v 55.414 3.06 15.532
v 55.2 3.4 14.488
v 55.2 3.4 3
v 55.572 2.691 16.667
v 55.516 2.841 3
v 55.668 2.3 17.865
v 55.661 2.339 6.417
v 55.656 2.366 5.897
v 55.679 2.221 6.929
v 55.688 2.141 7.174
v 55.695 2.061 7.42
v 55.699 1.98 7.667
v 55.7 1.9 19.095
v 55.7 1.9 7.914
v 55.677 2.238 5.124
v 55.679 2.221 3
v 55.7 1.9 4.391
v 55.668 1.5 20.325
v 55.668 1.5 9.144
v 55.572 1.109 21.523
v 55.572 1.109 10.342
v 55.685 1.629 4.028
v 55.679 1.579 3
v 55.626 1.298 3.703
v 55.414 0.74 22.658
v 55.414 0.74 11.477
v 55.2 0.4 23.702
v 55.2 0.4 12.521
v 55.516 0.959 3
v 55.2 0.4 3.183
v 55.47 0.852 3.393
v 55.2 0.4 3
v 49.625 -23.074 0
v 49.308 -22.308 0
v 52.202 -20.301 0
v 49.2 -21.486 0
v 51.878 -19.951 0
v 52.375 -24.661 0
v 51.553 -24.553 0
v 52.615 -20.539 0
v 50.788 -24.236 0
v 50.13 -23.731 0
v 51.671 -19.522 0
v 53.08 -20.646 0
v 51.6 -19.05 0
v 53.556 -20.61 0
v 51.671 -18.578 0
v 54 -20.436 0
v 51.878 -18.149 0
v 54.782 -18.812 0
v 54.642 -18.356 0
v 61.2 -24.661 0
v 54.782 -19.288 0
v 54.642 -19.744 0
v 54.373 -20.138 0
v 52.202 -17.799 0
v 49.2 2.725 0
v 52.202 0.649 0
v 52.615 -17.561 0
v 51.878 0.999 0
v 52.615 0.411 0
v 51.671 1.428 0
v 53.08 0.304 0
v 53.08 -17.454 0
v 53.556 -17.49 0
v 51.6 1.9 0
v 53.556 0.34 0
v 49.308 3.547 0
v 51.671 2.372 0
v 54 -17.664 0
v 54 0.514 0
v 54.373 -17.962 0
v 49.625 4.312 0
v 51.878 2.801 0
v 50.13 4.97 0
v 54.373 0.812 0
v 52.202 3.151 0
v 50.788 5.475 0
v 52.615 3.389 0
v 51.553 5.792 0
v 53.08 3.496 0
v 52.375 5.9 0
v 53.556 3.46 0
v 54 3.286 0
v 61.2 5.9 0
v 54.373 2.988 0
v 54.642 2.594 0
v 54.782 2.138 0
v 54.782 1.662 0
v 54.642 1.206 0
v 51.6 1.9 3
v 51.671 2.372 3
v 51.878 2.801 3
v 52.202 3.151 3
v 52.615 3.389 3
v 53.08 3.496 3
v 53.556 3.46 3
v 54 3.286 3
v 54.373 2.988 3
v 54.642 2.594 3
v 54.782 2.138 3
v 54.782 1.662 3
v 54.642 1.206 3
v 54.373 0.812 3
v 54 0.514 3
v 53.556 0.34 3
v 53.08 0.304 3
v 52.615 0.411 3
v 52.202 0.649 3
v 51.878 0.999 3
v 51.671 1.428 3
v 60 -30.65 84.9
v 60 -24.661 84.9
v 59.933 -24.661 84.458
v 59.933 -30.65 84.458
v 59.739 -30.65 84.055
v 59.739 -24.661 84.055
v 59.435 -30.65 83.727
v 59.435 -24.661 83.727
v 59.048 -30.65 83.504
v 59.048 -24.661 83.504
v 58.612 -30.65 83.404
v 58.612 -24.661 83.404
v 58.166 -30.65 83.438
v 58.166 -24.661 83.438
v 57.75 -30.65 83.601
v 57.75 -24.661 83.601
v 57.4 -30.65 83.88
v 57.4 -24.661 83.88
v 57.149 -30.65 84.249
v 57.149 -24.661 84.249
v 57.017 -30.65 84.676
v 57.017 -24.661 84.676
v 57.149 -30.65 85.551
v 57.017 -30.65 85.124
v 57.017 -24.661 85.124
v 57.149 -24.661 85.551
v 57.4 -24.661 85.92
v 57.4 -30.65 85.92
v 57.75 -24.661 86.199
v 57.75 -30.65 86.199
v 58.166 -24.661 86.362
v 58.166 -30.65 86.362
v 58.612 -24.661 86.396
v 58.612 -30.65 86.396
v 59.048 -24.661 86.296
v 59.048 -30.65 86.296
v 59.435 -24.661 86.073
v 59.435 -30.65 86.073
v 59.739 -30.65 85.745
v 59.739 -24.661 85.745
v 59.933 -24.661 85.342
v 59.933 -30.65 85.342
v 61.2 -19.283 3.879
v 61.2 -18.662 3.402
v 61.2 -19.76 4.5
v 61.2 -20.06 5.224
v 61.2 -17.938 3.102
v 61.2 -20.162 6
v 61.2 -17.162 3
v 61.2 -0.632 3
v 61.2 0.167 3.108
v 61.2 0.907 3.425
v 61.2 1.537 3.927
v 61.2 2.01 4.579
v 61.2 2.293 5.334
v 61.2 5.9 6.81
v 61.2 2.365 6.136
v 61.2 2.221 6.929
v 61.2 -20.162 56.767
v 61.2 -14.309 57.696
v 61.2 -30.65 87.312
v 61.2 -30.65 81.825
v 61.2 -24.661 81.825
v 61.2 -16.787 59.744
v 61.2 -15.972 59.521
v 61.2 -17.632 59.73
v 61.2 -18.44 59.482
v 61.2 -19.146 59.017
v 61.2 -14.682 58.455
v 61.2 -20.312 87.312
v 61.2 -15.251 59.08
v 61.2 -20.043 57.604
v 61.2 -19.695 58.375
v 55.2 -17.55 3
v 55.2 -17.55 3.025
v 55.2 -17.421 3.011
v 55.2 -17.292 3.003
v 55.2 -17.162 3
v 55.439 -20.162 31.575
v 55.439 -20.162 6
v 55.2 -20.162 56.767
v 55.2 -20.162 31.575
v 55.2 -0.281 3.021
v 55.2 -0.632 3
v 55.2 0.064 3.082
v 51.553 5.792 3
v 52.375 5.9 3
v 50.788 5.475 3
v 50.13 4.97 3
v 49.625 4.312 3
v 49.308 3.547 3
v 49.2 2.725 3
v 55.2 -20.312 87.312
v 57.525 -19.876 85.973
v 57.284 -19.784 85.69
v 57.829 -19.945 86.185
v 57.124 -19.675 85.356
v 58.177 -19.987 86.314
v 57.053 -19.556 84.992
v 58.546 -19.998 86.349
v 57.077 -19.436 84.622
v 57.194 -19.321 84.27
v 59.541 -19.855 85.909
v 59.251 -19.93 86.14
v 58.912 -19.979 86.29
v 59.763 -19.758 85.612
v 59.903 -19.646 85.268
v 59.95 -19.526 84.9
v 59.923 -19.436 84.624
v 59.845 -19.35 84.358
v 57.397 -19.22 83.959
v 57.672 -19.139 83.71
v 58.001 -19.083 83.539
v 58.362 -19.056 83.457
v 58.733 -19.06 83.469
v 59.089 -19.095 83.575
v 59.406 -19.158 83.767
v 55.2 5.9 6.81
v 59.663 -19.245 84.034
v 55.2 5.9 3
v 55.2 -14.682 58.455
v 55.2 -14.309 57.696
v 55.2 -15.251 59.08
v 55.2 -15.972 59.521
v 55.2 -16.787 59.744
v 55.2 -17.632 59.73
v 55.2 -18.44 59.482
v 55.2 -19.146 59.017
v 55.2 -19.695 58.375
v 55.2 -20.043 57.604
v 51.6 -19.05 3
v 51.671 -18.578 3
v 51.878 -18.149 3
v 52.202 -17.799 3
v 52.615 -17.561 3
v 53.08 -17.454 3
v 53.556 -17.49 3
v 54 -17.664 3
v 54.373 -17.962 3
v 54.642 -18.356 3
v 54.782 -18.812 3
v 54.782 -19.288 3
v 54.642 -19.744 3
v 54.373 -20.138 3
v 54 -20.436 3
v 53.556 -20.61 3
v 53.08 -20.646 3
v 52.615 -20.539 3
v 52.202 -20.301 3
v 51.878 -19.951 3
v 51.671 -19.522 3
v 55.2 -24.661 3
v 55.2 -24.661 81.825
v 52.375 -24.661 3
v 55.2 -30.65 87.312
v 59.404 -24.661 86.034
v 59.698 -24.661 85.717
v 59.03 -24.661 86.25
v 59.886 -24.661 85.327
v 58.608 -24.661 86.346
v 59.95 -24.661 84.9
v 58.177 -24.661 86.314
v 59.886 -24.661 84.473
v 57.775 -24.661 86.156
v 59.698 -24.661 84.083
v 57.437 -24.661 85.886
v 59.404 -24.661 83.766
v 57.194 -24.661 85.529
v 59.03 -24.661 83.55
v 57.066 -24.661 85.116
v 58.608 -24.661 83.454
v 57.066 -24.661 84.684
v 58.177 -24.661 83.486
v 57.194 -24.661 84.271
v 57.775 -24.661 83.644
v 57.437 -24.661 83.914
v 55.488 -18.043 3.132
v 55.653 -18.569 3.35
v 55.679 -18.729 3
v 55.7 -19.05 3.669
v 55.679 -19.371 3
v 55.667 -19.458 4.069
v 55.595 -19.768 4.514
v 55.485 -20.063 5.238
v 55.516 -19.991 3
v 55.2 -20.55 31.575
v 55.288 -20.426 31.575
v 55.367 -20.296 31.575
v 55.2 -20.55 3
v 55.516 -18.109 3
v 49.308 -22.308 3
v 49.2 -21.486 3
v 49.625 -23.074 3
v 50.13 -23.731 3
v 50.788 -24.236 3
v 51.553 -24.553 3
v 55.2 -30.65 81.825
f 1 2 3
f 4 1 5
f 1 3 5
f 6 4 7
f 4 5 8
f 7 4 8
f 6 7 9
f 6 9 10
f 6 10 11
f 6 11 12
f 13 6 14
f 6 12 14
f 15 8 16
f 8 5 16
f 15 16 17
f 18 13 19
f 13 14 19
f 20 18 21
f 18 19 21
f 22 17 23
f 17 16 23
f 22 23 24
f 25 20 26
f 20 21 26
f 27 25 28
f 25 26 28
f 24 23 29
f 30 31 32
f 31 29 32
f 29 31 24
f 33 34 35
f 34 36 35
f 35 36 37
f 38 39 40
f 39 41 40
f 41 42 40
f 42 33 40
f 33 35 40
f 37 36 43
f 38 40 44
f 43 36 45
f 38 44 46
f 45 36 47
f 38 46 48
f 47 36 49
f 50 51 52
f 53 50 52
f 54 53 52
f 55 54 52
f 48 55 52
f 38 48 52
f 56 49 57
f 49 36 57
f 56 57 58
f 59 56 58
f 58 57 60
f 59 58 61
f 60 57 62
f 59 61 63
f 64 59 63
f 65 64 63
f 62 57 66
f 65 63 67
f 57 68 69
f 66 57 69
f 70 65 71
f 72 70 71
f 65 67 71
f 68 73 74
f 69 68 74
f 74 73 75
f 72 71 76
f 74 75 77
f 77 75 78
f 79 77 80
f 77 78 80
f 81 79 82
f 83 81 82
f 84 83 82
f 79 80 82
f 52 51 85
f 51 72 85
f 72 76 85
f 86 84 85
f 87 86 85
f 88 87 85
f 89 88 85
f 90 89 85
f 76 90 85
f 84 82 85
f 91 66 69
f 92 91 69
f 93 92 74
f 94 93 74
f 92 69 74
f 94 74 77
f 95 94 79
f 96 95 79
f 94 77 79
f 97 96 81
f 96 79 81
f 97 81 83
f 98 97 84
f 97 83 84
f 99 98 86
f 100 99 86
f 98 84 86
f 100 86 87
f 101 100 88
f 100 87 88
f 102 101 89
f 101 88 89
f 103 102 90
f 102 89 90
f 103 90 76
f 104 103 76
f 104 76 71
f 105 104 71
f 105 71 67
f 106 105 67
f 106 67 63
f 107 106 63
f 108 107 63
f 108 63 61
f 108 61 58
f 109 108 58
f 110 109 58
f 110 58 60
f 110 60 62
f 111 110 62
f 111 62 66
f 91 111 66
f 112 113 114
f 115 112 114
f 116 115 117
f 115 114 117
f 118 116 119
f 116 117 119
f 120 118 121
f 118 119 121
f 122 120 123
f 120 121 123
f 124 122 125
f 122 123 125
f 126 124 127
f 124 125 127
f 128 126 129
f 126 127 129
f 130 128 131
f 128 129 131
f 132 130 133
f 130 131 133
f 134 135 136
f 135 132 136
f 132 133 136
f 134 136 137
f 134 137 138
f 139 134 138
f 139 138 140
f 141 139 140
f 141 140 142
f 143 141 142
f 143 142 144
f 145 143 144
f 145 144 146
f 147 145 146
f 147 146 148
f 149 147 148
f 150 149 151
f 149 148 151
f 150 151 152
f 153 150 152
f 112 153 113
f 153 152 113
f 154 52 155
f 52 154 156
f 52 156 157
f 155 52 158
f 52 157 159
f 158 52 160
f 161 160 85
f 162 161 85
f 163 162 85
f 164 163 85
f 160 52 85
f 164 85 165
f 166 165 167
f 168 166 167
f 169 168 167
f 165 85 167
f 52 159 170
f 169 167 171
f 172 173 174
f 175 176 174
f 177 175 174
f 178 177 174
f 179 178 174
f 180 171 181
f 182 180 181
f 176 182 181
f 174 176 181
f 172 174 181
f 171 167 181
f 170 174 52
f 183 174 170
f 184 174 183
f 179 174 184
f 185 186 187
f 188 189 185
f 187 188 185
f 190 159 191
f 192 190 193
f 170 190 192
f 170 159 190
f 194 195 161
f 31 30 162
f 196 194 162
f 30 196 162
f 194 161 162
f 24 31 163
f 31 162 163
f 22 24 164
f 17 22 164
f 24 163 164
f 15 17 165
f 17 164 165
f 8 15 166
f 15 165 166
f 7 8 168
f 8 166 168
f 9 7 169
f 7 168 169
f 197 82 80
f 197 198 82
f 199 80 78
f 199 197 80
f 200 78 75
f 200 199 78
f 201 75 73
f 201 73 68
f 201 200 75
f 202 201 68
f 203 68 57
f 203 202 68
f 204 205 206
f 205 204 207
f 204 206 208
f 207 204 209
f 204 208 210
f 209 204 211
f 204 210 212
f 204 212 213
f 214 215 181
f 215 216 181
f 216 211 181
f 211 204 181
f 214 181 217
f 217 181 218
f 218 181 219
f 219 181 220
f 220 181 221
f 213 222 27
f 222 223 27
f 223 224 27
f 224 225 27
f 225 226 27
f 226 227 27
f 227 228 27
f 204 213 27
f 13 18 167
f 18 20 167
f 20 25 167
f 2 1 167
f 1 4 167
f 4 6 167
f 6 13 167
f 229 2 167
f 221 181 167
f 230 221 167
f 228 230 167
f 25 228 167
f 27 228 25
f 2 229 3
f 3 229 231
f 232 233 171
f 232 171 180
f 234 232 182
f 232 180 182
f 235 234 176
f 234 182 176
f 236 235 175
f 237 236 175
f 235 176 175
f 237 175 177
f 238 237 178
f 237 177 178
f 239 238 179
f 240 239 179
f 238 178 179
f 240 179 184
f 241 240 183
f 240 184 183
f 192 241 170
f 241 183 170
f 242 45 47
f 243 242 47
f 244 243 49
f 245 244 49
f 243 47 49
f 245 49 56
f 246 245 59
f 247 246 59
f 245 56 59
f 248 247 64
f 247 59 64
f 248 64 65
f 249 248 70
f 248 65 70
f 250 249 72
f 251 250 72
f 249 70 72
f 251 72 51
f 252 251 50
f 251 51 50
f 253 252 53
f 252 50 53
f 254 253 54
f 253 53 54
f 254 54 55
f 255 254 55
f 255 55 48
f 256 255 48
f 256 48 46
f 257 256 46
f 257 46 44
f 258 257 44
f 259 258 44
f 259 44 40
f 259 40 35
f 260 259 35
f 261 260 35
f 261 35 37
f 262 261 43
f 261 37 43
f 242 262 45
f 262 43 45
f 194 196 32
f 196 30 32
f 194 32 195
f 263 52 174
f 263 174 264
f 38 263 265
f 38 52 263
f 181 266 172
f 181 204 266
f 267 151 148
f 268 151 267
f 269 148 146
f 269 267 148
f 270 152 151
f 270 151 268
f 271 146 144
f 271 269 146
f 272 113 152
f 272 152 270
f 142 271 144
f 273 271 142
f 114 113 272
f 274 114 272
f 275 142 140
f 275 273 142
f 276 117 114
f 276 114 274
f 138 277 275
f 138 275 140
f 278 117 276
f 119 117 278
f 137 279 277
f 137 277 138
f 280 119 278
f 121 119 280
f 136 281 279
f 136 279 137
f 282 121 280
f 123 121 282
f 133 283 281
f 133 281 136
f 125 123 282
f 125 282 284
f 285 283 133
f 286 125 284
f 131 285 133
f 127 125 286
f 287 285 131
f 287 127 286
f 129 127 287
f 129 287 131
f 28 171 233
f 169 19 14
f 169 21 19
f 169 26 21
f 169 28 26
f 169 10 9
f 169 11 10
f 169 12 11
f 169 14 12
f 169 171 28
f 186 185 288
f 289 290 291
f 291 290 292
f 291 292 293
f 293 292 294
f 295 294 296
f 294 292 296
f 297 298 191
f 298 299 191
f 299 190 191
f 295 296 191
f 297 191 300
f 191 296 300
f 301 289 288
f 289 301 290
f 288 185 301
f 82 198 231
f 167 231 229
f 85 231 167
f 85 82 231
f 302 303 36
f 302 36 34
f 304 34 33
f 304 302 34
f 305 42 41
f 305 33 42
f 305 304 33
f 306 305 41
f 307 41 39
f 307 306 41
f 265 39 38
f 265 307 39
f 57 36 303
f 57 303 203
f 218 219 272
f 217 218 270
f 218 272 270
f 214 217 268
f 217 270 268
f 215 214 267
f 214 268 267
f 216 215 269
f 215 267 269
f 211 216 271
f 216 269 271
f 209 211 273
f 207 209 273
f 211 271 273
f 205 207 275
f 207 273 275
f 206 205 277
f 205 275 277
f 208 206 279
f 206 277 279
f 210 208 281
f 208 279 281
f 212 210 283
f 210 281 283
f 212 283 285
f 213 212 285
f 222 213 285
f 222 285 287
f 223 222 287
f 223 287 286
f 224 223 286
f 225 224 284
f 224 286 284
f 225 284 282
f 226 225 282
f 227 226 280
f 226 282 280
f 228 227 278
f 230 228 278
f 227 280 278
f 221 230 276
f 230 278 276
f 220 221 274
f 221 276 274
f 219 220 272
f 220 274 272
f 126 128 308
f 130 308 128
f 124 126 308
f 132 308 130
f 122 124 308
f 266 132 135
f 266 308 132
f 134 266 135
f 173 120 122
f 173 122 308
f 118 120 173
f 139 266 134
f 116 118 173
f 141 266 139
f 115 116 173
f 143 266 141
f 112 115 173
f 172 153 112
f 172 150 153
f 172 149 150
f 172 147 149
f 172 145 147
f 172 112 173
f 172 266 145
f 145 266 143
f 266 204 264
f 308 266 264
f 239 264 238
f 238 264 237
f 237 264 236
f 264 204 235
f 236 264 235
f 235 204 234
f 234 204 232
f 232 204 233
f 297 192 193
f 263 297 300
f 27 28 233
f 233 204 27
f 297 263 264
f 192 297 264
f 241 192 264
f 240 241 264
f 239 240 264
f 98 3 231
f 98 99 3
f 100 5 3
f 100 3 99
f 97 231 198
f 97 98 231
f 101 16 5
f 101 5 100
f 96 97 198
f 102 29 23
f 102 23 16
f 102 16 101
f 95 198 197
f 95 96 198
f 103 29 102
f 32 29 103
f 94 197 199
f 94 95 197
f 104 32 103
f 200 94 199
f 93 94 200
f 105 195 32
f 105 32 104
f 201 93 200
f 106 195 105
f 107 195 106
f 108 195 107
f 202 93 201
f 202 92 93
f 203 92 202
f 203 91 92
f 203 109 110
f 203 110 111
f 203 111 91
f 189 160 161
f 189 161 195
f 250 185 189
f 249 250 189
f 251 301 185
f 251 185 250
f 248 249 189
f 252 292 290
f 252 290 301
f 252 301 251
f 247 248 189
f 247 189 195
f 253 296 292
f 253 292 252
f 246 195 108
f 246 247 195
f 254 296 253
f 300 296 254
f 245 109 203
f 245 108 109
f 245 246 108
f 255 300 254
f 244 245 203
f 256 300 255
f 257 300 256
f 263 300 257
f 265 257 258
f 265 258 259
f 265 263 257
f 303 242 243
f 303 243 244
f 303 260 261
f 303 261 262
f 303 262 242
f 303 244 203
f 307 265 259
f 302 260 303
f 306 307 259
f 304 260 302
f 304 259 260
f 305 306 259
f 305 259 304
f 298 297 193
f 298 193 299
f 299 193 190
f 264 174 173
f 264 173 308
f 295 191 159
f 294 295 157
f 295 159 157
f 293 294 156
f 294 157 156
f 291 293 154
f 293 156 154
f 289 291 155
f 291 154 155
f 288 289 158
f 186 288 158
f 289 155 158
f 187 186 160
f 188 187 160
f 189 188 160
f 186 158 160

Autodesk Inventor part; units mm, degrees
ref_plane "YZ Plane" through (0, 0, 0) normal (1, 0, 0) x (0, 1, 0)
ref_plane "XZ Plane" through (0, 0, 0) normal (0, 1, 0) x (-1, 0, 0)
ref_plane "Płaszczyzna konstrukcyjna2" through (0, 0, 0) normal (0, 0, 1) x (1, 0, 0)
sketch "Szkic2" plane through (0, 0, 0) normal (0, 0, 1) x (1, 0, 0)
  circle A0 centre (53.2, -19.05) radius 2 projected
  circle A1 centre (53.2, 1.9) radius 2 projected
  line L0 (61.2, -24.6614) -> (49.2, -24.6614)
  line L1 (49.2, -24.6614) -> (49.2, 5.9)
  line L2 (49.2, 5.9) -> (61.2, 5.9)
  line L3 (61.2, 5.9) -> (61.2, -24.6614)
  line L4 (60, -30.65) -> (57, -30.65) projected
  point P0 (0, 0)
  dimension "d0" = 4
  dimension "d1" = 4
  dimension "d2" = 12
  dimension "d3" = 30.5614
extrude "Wyciągnięcie proste1" add sketch "Szkic2" along normal blind 87.3125 contours A0 | A1 | L0 L1 L2 L3
sketch "Szkic3" plane through (49.2, -24.6614, 0) normal (0, -1, 0) x (1, 0, 0)
  circle A0 centre (9.3, 84.9) radius 1.5 projected
  circle A1 centre (9.3, 84.9) radius 1.45
  point P0 (-49.2, 0)
  dimension "d6" = 2.9
extrude "Wyciągnięcie proste2" cut sketch "Szkic3" against normal blind 10 contours A1
sketch "Szkic4" plane through (0, 0, 0) normal (0, 0, -1) x (-1, 0, 0)
  point P0 (0, 0)
sketch "Szkic6" plane through (61.2, -24.6614, 0) normal (1, 0, 0) x (0, 0, -1)
  point P0 (0, 24.6614)
sketch "Szkic5" plane through (0, 0, 0) normal (0, 0, -1) x (-1, 0, 0)
  circle A0 centre (-53.2, 1.9) radius 2 projected
  circle A1 centre (-53.2, -19.05) radius 2 projected
  circle A2 centre (-53.2, -19.05) radius 1.6
  circle A3 centre (-53.2, 1.9) radius 1.6
  point P0 (0, 0)
  dimension "d9" = 3.2
  dimension "d10" = 3.2
extrude "Wyciągnięcie proste3" cut sketch "Szkic5" against normal blind 6 contours A2 | A3
sketch "Szkic7" plane through (61.2, -24.6614, 0) normal (1, 0, 0) x (0, 0, -1)
  line L0 (-87.3125, 30.5614) -> (-87.3125, 0) projected
  line L1 (-87.3125, 4.3495) -> (-6.8101, 30.5614)
  line L2 (-57.6962, 10.3521) -> (-6.9288, 26.8822)
  line L3 (0, 28.1614) -> (-6, 28.1614) projected
  line L4 (-3, 24.0296) -> (-3, 7.4995)
  line L5 (-6, 4.4995) -> (-56.7674, 4.4995)
  line L6 (0, 30.5614) -> (-87.3125, 30.5614) projected
  arc A0 (-57.6962, 10.3521) -> (-56.7674, 4.4995) centre (-56.7674, 7.4995) ccw
  arc A1 (-6, 4.4995) -> (-3, 7.4995) centre (-6, 7.4995) ccw
  arc A2 (-3, 24.0296) -> (-6.9288, 26.8822) centre (-6, 24.0296) ccw
  point P0 (0, 24.6614)
  point P1 (-75.6708, 4.4995)
  point P2 (-3, 28.1614)
  point P3 (-3, 4.4995)
  dimension "d17" = 3
extrude "Wyciągnięcie proste4" cut sketch "Szkic7" against normal blind 14.7625
sketch "Szkic8" plane through (49.2, -24.6614, 0) normal (0, -1, 0) x (1, 0, 0)
  line L0 (0, 87.3125) -> (12, 87.3125) projected
  line L1 (0, 0) -> (0, 6.8101) projected
  line L2 (12, 0) -> (12, 87.3125) projected
  line L3 (0, 0) -> (0, 87.3125) projected
  line L4 (0, 0) -> (12, 0) projected
  line L5 (6, 87.3125) -> (6, 3)
  line L6 (12, 3) -> (0, 3) projected
  point P0 (-49.2, 0)
extrude "Wyciągnięcie proste5" cut sketch "Szkic8" against normal blind 30.6375 contours L0 L5 L6 L1 L3
sketch "Szkic9" plane through (49.2, -24.6614, 0) normal (0, -1, 0) x (1, 0, 0)
  line L0 (6, 87.3125) -> (6, 3) projected
  line L1 (12, 6.8101) -> (12, 87.3125) projected
  line L2 (6, 87.3125) -> (12, 87.3125)
  line L3 (12, 87.3125) -> (12, 81.8248)
  line L4 (12, 81.8248) -> (6, 81.8248)
  line L5 (6, 81.8248) -> (6, 87.3125)
  circle A0 centre (9.3, 84.9) radius 1.5 projected
  point P0 (-49.2, 0)
ref_plane "Płaszczyzna konstrukcyjna3" through (-147.5, -30.65, -16.2) normal (0, 1, 0) x (0, 0, 1)
extrude "Wyciągnięcie proste6" add sketch "Szkic9" along normal up to surface (5.9886 mm away)
sketch "Szkic10" plane through (61.2, -17.1619, 3) normal (0, 0, 1) x (1, 0, 0)
  point P0 (-61.2, 17.1619)
sketch "Szkic11" plane through (61.2, -17.1619, 3) normal (0, 0, 1) x (1, 0, 0)
  circle A0 centre (-8, -1.8881) radius 1.6 projected
  circle A1 centre (-8, 19.0619) radius 1.6 projected
  circle A2 centre (-8, -1.8881) radius 1.6 projected
  circle A3 centre (-8, -1.8881) radius 2.5
  circle A4 centre (-8, 19.0619) radius 2.5
  point P0 (-61.2, 17.1619)
  dimension "d20" = 5
extrude "Wyciągnięcie proste7" cut sketch "Szkic11" along normal blind 28.575 contours A0 | A1 | A3 | A4
fillet "Zaokrąglenie1" radius 3.175 2 edges at (49.2, 5.9, 1.5) (49.2, -24.6614, 1.5)
properties part number "wzmocnienie"
